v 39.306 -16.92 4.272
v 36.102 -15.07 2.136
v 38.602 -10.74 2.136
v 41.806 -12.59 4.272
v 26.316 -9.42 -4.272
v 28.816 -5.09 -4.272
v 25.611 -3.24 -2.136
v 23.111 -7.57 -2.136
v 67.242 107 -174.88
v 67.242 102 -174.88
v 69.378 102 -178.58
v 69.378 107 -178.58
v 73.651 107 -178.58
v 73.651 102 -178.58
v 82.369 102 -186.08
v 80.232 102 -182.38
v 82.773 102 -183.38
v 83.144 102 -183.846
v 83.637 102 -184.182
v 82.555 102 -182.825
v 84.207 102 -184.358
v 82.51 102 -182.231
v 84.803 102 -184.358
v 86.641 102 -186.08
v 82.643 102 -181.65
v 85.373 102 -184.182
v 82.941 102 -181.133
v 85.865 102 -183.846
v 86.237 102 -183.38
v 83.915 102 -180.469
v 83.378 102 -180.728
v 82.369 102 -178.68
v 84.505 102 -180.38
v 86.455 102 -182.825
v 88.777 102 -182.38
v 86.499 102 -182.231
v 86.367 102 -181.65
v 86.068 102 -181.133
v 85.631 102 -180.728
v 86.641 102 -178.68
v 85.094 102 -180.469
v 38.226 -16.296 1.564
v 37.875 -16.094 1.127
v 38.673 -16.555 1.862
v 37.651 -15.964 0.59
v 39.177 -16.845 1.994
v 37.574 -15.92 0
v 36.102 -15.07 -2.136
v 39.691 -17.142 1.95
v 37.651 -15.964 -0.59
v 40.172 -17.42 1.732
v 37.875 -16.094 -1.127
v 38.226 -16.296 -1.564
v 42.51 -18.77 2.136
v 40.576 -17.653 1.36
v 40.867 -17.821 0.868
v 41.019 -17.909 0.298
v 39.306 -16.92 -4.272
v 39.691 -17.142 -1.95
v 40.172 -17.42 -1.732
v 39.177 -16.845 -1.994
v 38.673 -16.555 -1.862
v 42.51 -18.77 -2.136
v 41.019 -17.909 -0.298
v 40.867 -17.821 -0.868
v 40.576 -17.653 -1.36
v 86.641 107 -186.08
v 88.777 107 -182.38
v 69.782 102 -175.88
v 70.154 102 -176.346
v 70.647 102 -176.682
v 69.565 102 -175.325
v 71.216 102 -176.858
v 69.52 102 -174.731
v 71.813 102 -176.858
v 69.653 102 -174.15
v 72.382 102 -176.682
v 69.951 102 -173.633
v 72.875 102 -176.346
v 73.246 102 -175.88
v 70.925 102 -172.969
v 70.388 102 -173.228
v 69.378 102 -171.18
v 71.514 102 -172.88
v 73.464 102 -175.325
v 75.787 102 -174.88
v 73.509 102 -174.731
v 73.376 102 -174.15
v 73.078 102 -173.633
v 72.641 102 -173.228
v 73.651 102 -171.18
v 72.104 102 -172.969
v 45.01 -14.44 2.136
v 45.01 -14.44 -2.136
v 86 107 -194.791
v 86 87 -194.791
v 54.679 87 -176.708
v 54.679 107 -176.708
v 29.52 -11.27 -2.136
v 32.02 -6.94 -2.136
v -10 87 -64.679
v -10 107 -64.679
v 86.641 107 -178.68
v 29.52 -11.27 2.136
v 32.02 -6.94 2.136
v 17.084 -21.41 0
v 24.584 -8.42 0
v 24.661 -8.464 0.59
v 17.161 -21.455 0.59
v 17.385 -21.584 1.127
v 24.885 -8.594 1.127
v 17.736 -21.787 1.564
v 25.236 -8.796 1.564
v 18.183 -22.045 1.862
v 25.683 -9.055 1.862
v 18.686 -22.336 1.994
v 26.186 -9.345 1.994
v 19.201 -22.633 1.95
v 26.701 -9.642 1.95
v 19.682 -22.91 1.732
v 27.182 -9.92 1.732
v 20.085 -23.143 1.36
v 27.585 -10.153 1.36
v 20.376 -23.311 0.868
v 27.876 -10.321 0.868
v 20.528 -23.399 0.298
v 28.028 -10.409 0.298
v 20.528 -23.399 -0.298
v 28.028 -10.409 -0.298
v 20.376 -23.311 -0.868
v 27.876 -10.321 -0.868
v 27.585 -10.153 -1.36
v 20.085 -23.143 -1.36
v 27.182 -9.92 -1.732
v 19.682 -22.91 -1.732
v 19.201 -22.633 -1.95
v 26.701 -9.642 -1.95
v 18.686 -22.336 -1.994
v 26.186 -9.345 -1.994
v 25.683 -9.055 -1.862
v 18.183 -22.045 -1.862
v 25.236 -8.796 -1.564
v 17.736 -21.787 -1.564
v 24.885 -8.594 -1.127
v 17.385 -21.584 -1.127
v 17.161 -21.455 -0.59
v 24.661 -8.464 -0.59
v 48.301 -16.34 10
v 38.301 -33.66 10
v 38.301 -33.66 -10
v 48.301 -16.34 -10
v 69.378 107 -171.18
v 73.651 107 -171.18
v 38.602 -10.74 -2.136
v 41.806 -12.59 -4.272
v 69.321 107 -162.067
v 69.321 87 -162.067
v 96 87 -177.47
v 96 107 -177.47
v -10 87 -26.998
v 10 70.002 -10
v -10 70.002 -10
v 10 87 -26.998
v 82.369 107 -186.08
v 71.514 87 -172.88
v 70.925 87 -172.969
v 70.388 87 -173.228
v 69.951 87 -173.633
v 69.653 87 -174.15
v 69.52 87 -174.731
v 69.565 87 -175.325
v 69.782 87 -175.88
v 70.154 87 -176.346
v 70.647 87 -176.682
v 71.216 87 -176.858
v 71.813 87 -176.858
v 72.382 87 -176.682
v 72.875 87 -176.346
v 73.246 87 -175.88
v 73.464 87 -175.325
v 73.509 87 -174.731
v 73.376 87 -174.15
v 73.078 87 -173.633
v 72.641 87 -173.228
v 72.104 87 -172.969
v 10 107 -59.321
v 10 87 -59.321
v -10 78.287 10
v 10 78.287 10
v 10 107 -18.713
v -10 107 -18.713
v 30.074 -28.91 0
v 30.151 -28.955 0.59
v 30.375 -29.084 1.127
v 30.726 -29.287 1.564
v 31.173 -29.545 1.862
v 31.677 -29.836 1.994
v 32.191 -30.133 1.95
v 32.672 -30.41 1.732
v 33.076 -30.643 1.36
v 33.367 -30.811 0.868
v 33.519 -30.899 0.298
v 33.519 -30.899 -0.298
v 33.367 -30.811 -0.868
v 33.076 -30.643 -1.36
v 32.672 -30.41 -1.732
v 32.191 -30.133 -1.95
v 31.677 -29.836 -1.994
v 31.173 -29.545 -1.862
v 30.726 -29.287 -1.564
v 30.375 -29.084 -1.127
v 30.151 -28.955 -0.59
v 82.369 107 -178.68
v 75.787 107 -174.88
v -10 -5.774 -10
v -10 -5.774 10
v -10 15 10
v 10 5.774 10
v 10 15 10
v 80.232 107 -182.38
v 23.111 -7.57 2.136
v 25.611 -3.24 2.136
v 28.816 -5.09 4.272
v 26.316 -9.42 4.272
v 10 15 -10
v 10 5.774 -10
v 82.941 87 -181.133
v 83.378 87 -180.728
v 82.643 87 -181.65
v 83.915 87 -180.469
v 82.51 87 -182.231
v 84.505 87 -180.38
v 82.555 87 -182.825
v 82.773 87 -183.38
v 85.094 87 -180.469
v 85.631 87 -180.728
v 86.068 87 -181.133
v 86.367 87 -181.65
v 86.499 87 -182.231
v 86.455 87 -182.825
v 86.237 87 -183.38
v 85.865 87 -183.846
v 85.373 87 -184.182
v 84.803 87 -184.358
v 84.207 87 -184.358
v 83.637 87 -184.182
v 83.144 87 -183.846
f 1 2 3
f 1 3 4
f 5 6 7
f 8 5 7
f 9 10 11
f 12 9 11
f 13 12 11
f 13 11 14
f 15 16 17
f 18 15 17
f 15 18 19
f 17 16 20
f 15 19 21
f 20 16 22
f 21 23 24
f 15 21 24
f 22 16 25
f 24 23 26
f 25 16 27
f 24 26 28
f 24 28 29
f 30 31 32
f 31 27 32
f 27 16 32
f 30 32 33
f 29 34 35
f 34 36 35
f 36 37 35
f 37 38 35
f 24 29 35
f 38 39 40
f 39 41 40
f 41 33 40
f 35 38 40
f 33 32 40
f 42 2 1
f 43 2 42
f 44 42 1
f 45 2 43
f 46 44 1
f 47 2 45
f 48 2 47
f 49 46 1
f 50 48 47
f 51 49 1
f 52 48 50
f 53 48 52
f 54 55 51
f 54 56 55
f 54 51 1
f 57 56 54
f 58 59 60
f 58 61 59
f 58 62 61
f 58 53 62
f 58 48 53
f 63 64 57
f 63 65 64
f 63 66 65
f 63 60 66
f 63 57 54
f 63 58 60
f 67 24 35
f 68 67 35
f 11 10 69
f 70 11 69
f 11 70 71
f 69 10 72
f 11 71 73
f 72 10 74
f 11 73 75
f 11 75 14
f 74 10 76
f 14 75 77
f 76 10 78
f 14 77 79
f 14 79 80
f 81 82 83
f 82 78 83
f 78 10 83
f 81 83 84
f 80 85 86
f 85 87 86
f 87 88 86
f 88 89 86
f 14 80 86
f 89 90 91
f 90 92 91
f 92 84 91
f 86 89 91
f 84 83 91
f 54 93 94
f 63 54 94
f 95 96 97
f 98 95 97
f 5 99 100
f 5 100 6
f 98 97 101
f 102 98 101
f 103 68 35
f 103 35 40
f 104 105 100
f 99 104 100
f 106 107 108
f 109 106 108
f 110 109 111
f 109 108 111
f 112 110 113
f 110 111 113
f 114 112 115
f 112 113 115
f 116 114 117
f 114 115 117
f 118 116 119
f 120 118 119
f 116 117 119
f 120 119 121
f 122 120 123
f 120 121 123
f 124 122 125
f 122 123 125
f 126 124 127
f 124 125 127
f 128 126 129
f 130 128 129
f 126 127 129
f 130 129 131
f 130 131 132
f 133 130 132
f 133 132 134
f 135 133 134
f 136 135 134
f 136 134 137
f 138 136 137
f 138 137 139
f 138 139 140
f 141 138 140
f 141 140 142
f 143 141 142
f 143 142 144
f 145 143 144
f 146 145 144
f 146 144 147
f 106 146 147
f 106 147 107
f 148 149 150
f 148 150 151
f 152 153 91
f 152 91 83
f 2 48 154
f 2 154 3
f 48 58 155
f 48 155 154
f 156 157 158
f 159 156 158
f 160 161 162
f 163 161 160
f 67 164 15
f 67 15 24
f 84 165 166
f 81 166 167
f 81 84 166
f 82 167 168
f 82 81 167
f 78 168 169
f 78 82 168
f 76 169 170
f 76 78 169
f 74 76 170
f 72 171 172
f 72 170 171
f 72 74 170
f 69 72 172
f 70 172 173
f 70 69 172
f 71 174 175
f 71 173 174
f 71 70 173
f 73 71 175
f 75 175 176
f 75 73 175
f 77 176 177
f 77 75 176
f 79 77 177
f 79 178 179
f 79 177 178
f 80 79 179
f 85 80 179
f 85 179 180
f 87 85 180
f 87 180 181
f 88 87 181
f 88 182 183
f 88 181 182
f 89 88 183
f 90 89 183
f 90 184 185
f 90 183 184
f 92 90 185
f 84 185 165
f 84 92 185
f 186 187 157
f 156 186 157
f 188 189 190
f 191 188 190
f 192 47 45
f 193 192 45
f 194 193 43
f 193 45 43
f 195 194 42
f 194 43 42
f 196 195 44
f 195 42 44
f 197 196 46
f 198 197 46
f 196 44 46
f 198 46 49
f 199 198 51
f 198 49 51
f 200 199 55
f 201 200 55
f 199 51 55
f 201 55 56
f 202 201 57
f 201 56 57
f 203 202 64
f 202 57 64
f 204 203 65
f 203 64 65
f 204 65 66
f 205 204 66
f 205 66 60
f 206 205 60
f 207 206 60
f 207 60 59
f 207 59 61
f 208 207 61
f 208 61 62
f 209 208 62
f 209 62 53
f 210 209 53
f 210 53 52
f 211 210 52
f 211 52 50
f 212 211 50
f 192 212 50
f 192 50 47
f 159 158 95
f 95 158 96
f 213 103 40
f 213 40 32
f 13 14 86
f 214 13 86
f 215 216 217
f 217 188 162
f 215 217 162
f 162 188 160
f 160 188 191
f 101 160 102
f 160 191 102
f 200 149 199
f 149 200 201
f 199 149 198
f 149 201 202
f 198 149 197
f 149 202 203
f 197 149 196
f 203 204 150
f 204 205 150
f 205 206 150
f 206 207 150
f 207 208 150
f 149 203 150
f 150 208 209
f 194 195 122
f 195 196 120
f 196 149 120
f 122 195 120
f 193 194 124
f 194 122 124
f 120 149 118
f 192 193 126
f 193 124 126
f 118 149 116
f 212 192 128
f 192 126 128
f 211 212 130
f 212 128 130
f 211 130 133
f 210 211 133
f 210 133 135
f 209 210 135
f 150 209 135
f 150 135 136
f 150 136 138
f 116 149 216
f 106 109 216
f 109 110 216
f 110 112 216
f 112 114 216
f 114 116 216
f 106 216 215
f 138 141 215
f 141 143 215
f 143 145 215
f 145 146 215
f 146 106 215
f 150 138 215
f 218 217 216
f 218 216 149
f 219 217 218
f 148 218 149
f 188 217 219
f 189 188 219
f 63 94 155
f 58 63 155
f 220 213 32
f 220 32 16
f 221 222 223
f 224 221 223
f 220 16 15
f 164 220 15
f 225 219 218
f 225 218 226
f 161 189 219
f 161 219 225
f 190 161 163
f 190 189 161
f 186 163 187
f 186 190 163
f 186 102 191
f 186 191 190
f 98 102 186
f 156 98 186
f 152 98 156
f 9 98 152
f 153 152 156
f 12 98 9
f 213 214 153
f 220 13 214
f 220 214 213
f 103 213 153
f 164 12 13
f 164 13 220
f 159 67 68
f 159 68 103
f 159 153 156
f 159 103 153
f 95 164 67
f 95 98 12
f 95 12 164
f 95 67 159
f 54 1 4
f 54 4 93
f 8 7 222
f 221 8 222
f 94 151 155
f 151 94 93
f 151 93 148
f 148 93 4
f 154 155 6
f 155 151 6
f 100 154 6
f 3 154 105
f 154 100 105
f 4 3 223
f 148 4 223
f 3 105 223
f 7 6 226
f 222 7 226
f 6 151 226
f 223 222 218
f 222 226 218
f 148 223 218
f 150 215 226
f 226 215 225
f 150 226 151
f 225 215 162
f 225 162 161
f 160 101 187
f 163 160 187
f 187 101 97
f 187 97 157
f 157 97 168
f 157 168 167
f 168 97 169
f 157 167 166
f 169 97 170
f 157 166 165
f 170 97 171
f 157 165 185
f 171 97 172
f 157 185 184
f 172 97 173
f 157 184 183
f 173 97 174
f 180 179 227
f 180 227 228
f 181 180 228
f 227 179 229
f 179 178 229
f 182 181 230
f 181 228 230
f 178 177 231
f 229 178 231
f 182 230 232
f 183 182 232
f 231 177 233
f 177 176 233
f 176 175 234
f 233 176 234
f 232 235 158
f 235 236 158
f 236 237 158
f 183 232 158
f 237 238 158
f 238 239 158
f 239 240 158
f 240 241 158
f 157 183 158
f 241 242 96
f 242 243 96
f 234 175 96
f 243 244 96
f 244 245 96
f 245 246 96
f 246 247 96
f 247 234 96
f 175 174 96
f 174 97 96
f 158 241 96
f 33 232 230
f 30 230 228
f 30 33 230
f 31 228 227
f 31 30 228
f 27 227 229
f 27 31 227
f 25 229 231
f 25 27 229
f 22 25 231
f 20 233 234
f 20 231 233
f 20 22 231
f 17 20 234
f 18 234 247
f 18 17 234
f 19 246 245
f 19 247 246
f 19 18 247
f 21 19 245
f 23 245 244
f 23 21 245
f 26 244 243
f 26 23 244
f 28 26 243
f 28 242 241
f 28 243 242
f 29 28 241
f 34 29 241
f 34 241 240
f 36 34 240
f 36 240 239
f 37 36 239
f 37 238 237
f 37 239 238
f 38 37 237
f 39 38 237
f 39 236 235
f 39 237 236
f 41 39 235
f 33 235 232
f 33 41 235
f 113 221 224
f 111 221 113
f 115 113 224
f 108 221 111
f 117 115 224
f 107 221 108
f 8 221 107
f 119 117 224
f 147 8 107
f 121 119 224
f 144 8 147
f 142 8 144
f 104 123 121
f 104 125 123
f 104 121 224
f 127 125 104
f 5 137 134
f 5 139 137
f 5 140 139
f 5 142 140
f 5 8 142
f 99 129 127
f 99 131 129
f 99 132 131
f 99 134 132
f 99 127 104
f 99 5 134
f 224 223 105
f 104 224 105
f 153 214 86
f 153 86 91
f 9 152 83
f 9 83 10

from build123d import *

# Parameters (mm, degrees)
SKETCH4_W           = 20
SKETCH4_H           = 20
SWEEP2_START        = -10
SWEEP2_OUTLINE_W    = 20
SWEEP2_OUTLINE_H    = 92
SWEEP2_DEPTH        = 20
SWEEP2_START_2      = -15
SWEEP2_2_OUTLINE_W  = 20
SWEEP2_2_OUTLINE_H  = 20
SWEEP2_2_DEPTH      = 5
SWEEP3_START        = 87
SWEEP3_DEPTH        = 20
CUT_EXTRUDE3_REACH  = 238.421
SKETCH5_R           = 2
SKETCH5_3_R         = 2
CUT_EXTRUDE4_DEPTH  = 5
CUT_EXTRUDE5_REACH  = 208.616
SKETCH6_R           = 2
SKETCH6_5_R         = 2
CUT_EXTRUDE6_DEPTH  = 5
CUT_EXTRUDE7_DEPTH  = 239.303090645
BOSS_EXTRUDE1_DEPTH = 20


# Read off the part's stored shape, not the designer's step: Sweep2, Sweep3
with BuildPart() as part:
    # Sweep1: sweep along a path in Sketch1
    with BuildLine(Plane.XY) as sweep1_path:
        Line((43.301270189, -25), (0, 0))
        Line((0, 0), (0, 15))
    # Sketch4 → Sweep1 (sweep)
    with BuildSketch(Plane(origin=(43.301270189, -25, 0), x_dir=(0, 0, -1), z_dir=(0.8660254037844382, -0.5000000000000011, 0))):
        Rectangle(SKETCH4_W, SKETCH4_H)
    sweep(path=sweep1_path.line, transition=Transition.RIGHT)

    # Sweep2 outline → Sweep2 (add)
    with BuildSketch(Plane.XY.offset(SWEEP2_START)):
        with Locations((0, 61)):
            Rectangle(SWEEP2_OUTLINE_W, SWEEP2_OUTLINE_H)
    extrude(amount=SWEEP2_DEPTH)

    # Sweep2 2 outline → Sweep2 2 (add)
    with BuildSketch(Plane.XY.offset(SWEEP2_START_2)):
        with Locations((0, 97)):
            Rectangle(SWEEP2_2_OUTLINE_W, SWEEP2_2_OUTLINE_H)
    extrude(amount=SWEEP2_2_DEPTH)

    # Sweep3 outline → Sweep3 (add)
    with BuildSketch(Plane(origin=(0, 0, 0), x_dir=(1, 0, 0), z_dir=(0, 1, 0)).offset(SWEEP3_START)):
        Polygon((54.679491924, 176.707658145), (-10, 64.679491924), (-10, 15), (10, 15), (10, 59.320508076), (69.320508076, 162.066641994), (96, 177.470053838), (86, 194.790561914), align=None)
    extrude(amount=SWEEP3_DEPTH)

    # Sketch5 → Cut-Extrude3 (cut, up to next)
    with BuildSketch(Plane(origin=(5, 8.660254038, 0), x_dir=(0.8660254037844382, -0.500000000000001, 0), z_dir=(0.5000000000000009, 0.866025403784438, 0)), mode=Mode.PRIVATE) as cut_extrude3_sk1:
        with Locations(Location((27.5, 0, 0), (0, 0, 180))):
            Circle(SKETCH5_R)
    cut_extrude3_tool1 = extrude(cut_extrude3_sk1.sketch, amount=-CUT_EXTRUDE3_REACH, mode=Mode.PRIVATE) & part.part
    # Sketch5 → Cut-Extrude3 (cut, up to next)
    with BuildSketch(Plane(origin=(5, 8.660254038, 0), x_dir=(0.8660254037844382, -0.500000000000001, 0), z_dir=(0.5000000000000009, 0.866025403784438, 0)), mode=Mode.PRIVATE) as cut_extrude3_sk2:
        with Locations(Location((42.5, 0, 0), (0, 0, 180))):
            Circle(SKETCH5_R)
    cut_extrude3_tool2 = extrude(cut_extrude3_sk2.sketch, amount=-CUT_EXTRUDE3_REACH, mode=Mode.PRIVATE) & part.part
    add(cut_extrude3_tool1.solids().sort_by_distance((28.815699, -5.089746, 0))[0], mode=Mode.SUBTRACT)
    add(cut_extrude3_tool2.solids().sort_by_distance((41.80608, -12.589746, 0))[0], mode=Mode.SUBTRACT)

    # Sketch5<3> → Cut-Extrude4 (cut)
    # profile 1 of 2: a face of its own
    with BuildSketch(Plane(origin=(5, 8.660254038, 0), x_dir=(0.8660254037844382, -0.500000000000001, 0), z_dir=(0.5000000000000009, 0.866025403784438, 0))):
        Polygon((31.2, -2.136195996), (31.2, 2.136195996), (27.5, 4.272391992), (23.8, 2.136195996), (23.8, -2.136195996), (27.5, -4.272391992), align=None)
        with Locations(Location((27.5, 0, 0), (0, 0, 180))):
            Circle(SKETCH5_3_R, mode=Mode.SUBTRACT)
    # profile 2 of 2: a face of its own
    with BuildSketch(Plane(origin=(5, 8.660254038, 0), x_dir=(0.8660254037844382, -0.500000000000001, 0), z_dir=(0.5000000000000009, 0.866025403784438, 0))):
        Polygon((46.2, -2.136195996), (46.2, 2.136195996), (42.5, 4.272391992), (38.8, 2.136195996), (38.8, -2.136195996), (42.5, -4.272391992), align=None)
        with Locations(Location((42.5, 0, 0), (0, 0, 180))):
            Circle(SKETCH5_3_R, mode=Mode.SUBTRACT)
    extrude(amount=-CUT_EXTRUDE4_DEPTH, mode=Mode.SUBTRACT)

    # Sketch6 → Cut-Extrude5 (cut, up to next)
    with BuildSketch(Plane(origin=(0, 107, -107), x_dir=(1, 0, 0), z_dir=(0, -1, 0)), mode=Mode.PRIVATE) as cut_extrude5_sk1:
        with Locations(Location((71.514428415, -67.880307876, 0), (0, 0, 90))):
            Circle(SKETCH6_R)
    cut_extrude5_tool1 = extrude(cut_extrude5_sk1.sketch, amount=CUT_EXTRUDE5_REACH, mode=Mode.PRIVATE) & part.part
    # Sketch6 → Cut-Extrude5 (cut, up to next)
    with BuildSketch(Plane(origin=(0, 107, -107), x_dir=(1, 0, 0), z_dir=(0, -1, 0)), mode=Mode.PRIVATE) as cut_extrude5_sk2:
        with Locations(Location((84.504809472, -75.380307876, 0), (0, 0, 90))):
            Circle(SKETCH6_R)
    cut_extrude5_tool2 = extrude(cut_extrude5_sk2.sketch, amount=CUT_EXTRUDE5_REACH, mode=Mode.PRIVATE) & part.part
    add(cut_extrude5_tool1.solids().sort_by_distance((71.514428, 107, -174.880308))[0], mode=Mode.SUBTRACT)
    add(cut_extrude5_tool2.solids().sort_by_distance((84.504809, 107, -182.380308))[0], mode=Mode.SUBTRACT)

    # Sketch6<5> → Cut-Extrude6 (cut)
    # profile 1 of 2: a face of its own
    with BuildSketch(Plane(origin=(0, 107, -107), x_dir=(1, 0, 0), z_dir=(0, -1, 0))):
        Polygon((75.786820407, -67.880307876), (73.650624411, -64.180307876), (69.378232419, -64.180307876), (67.242036423, -67.880307876), (69.378232419, -71.580307876), (73.650624411, -71.580307876), align=None)
        with Locations(Location((71.514428415, -67.880307876, 0), (0, 0, 90))):
            Circle(SKETCH6_5_R, mode=Mode.SUBTRACT)
    # profile 2 of 2: a face of its own
    with BuildSketch(Plane(origin=(0, 107, -107), x_dir=(1, 0, 0), z_dir=(0, -1, 0))):
        Polygon((88.777201464, -75.380307876), (86.641005468, -71.680307876), (82.368613476, -71.680307876), (80.23241748, -75.380307876), (82.368613476, -79.080307876), (86.641005468, -79.080307876), align=None)
        with Locations(Location((84.504809472, -75.380307876, 0), (0, 0, 90))):
            Circle(SKETCH6_5_R, mode=Mode.SUBTRACT)
    extrude(amount=CUT_EXTRUDE6_DEPTH, mode=Mode.SUBTRACT)

    # Sketch7 → Cut-Extrude7 (cut, through all)
    with BuildSketch(Plane(origin=(10, 0, 0), x_dir=(0, 0, -1), z_dir=(1, 0, 0))):
        Polygon((4.356747298, 92.643252702), (-10, 107), (-10, 78.286505404), align=None)
        Polygon((18.713494596, 107), (-10, 107), (4.356747298, 92.643252702), align=None)
    extrude(amount=-CUT_EXTRUDE7_DEPTH, mode=Mode.SUBTRACT)

    # Sketch7<3> → Boss-Extrude1 (add, through all)
    with BuildSketch(Plane(origin=(10, 0, 0), x_dir=(0, 0, -1), z_dir=(1, 0, 0))):
        Polygon((26.997765843, 87), (10, 87), (10, 70.002234157), align=None)
    extrude(amount=-BOSS_EXTRUDE1_DEPTH)


solid = part.part
